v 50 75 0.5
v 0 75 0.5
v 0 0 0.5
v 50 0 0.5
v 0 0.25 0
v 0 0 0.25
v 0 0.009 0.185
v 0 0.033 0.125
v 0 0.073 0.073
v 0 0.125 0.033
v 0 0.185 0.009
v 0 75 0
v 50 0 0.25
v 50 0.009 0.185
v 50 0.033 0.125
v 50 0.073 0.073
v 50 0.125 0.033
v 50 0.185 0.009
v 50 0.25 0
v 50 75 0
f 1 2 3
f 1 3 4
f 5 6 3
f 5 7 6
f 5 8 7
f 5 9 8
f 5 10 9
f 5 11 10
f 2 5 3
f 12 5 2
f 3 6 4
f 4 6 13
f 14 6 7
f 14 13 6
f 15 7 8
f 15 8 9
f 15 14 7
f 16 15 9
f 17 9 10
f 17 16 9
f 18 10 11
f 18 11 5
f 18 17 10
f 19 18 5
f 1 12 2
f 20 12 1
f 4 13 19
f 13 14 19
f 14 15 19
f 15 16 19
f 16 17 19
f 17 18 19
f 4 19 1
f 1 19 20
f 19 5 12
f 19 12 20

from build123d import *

# Parameters (mm, degrees)
ESQUISSE1_W        = 50
ESQUISSE1_H        = 75
BOSS_EXTRU_1_DEPTH = 0.5
CONG_1_R           = 0.25


with BuildPart() as part:
    # Esquisse1 → Boss.-Extru.1 (new body)
    with BuildSketch(Plane.XY):
        with Locations((25, 37.5)):
            Rectangle(ESQUISSE1_W, ESQUISSE1_H)
    extrude(amount=BOSS_EXTRU_1_DEPTH)

    # Congé1
    cong_1_edges = [part.edges().sort_by_distance(p)[0] for p in [
        (25, 0, 0),
    ]]
    fillet(cong_1_edges, radius=CONG_1_R)


solid = part.part
